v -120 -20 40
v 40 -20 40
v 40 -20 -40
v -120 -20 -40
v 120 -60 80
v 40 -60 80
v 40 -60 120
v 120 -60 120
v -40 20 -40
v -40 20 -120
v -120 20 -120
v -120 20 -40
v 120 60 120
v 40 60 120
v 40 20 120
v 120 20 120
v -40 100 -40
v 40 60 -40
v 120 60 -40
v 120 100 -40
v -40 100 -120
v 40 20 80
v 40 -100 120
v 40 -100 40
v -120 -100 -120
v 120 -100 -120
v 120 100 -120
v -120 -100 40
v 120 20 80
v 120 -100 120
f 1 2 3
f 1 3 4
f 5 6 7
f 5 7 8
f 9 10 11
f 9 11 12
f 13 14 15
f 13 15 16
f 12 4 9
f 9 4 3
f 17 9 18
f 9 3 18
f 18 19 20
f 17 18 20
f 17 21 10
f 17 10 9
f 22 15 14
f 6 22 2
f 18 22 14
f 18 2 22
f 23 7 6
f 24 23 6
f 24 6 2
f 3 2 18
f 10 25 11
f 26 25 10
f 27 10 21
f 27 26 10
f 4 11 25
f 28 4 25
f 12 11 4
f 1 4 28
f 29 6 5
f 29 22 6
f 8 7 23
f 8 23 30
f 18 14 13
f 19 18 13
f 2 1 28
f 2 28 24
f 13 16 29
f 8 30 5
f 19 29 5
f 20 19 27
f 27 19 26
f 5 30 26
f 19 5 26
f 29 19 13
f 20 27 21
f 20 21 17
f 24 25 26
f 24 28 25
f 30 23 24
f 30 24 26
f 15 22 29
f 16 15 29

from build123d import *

# Parameters (mm, degrees)
SKETCH1_W            = 80
SKETCH1_H            = 40
BOSS_EXTRUDE1_DEPTH  = 120
BOSS_EXTRUDE2_DEPTH  = 40
BOSS_EXTRUDE3_DEPTH  = 80
SKETCH1_5_W          = 80
SKETCH1_5_H          = 40
BOSS_EXTRUDE4_DEPTH  = 120
SKETCH1_6_W          = 80
SKETCH1_6_H          = 40
BOSS_EXTRUDE5_DEPTH  = 120
BOSS_EXTRUDE6_DEPTH  = 120
SKETCH1_8_W          = 80
SKETCH1_8_H          = 40
BOSS_EXTRUDE7_DEPTH  = 120
BOSS_EXTRUDE8_DEPTH  = 120
SKETCH2_W            = 80
SKETCH2_H            = 80
BOSS_EXTRUDE9_DEPTH  = 40
SKETCH3_W            = 80
SKETCH3_H            = 120
BOSS_EXTRUDE10_DEPTH = 80
SKETCH4_W            = 80
SKETCH4_H            = 40
BOSS_EXTRUDE11_DEPTH = 80


with BuildPart() as part:
    # Sketch1 → Boss-Extrude1 (new body)
    with BuildSketch(Plane.XY):
        with Locations((80, -80)):
            Rectangle(SKETCH1_W, SKETCH1_H)
    extrude(amount=BOSS_EXTRUDE1_DEPTH)

    # Sketch1<3> → Boss-Extrude2 (add)
    with BuildSketch(Plane.XY):
        Polygon((40, -100), (40, -60), (40, -20), (-120, -20), (-120, -100), align=None)
    extrude(amount=BOSS_EXTRUDE2_DEPTH)

    # Sketch1<4> → Boss-Extrude3 (add)
    with BuildSketch(Plane.XY):
        Polygon((40, -60), (120, -60), (120, 20), (40, 20), (40, -20), align=None)
    extrude(amount=BOSS_EXTRUDE3_DEPTH)

    # Sketch1<5> → Boss-Extrude4 (add)
    with BuildSketch(Plane.XY):
        with Locations((80, 40)):
            Rectangle(SKETCH1_5_W, SKETCH1_5_H)
    extrude(amount=BOSS_EXTRUDE4_DEPTH)

    # Sketch1<6> → Boss-Extrude5 (add)
    with BuildSketch(Plane.XY):
        with Locations((80, 40)):
            Rectangle(SKETCH1_6_W, SKETCH1_6_H)
    extrude(amount=-BOSS_EXTRUDE5_DEPTH)

    # Sketch1<7> → Boss-Extrude6 (add)
    with BuildSketch(Plane.XY):
        Polygon((40, -60), (120, -60), (120, 20), (40, 20), (40, -20), align=None)
    extrude(amount=-BOSS_EXTRUDE6_DEPTH)

    # Sketch1<8> → Boss-Extrude7 (add)
    with BuildSketch(Plane.XY):
        with Locations((80, -80)):
            Rectangle(SKETCH1_8_W, SKETCH1_8_H)
    extrude(amount=-BOSS_EXTRUDE7_DEPTH)

    # Sketch1<9> → Boss-Extrude8 (add)
    with BuildSketch(Plane.XY):
        Polygon((40, -100), (40, -60), (40, -20), (-120, -20), (-120, -100), align=None)
    extrude(amount=-BOSS_EXTRUDE8_DEPTH)

    # Sketch2 → Boss-Extrude9 (add)
    with BuildSketch(Plane(origin=(0, 60, 0), x_dir=(1, 0, 0), z_dir=(0, 1, 0))):
        with Locations((80, 80)):
            Rectangle(SKETCH2_W, SKETCH2_H)
    extrude(amount=BOSS_EXTRUDE9_DEPTH)

    # Sketch3 → Boss-Extrude10 (add)
    with BuildSketch(Plane.ZY.offset(-40)):
        with Locations((-80, 40)):
            Rectangle(SKETCH3_W, SKETCH3_H)
    extrude(amount=BOSS_EXTRUDE10_DEPTH)

    # Sketch4 → Boss-Extrude11 (add)
    with BuildSketch(Plane.ZY.offset(40)):
        with Locations((-80, 0)):
            Rectangle(SKETCH4_W, SKETCH4_H)
    extrude(amount=BOSS_EXTRUDE11_DEPTH)


solid = part.part
